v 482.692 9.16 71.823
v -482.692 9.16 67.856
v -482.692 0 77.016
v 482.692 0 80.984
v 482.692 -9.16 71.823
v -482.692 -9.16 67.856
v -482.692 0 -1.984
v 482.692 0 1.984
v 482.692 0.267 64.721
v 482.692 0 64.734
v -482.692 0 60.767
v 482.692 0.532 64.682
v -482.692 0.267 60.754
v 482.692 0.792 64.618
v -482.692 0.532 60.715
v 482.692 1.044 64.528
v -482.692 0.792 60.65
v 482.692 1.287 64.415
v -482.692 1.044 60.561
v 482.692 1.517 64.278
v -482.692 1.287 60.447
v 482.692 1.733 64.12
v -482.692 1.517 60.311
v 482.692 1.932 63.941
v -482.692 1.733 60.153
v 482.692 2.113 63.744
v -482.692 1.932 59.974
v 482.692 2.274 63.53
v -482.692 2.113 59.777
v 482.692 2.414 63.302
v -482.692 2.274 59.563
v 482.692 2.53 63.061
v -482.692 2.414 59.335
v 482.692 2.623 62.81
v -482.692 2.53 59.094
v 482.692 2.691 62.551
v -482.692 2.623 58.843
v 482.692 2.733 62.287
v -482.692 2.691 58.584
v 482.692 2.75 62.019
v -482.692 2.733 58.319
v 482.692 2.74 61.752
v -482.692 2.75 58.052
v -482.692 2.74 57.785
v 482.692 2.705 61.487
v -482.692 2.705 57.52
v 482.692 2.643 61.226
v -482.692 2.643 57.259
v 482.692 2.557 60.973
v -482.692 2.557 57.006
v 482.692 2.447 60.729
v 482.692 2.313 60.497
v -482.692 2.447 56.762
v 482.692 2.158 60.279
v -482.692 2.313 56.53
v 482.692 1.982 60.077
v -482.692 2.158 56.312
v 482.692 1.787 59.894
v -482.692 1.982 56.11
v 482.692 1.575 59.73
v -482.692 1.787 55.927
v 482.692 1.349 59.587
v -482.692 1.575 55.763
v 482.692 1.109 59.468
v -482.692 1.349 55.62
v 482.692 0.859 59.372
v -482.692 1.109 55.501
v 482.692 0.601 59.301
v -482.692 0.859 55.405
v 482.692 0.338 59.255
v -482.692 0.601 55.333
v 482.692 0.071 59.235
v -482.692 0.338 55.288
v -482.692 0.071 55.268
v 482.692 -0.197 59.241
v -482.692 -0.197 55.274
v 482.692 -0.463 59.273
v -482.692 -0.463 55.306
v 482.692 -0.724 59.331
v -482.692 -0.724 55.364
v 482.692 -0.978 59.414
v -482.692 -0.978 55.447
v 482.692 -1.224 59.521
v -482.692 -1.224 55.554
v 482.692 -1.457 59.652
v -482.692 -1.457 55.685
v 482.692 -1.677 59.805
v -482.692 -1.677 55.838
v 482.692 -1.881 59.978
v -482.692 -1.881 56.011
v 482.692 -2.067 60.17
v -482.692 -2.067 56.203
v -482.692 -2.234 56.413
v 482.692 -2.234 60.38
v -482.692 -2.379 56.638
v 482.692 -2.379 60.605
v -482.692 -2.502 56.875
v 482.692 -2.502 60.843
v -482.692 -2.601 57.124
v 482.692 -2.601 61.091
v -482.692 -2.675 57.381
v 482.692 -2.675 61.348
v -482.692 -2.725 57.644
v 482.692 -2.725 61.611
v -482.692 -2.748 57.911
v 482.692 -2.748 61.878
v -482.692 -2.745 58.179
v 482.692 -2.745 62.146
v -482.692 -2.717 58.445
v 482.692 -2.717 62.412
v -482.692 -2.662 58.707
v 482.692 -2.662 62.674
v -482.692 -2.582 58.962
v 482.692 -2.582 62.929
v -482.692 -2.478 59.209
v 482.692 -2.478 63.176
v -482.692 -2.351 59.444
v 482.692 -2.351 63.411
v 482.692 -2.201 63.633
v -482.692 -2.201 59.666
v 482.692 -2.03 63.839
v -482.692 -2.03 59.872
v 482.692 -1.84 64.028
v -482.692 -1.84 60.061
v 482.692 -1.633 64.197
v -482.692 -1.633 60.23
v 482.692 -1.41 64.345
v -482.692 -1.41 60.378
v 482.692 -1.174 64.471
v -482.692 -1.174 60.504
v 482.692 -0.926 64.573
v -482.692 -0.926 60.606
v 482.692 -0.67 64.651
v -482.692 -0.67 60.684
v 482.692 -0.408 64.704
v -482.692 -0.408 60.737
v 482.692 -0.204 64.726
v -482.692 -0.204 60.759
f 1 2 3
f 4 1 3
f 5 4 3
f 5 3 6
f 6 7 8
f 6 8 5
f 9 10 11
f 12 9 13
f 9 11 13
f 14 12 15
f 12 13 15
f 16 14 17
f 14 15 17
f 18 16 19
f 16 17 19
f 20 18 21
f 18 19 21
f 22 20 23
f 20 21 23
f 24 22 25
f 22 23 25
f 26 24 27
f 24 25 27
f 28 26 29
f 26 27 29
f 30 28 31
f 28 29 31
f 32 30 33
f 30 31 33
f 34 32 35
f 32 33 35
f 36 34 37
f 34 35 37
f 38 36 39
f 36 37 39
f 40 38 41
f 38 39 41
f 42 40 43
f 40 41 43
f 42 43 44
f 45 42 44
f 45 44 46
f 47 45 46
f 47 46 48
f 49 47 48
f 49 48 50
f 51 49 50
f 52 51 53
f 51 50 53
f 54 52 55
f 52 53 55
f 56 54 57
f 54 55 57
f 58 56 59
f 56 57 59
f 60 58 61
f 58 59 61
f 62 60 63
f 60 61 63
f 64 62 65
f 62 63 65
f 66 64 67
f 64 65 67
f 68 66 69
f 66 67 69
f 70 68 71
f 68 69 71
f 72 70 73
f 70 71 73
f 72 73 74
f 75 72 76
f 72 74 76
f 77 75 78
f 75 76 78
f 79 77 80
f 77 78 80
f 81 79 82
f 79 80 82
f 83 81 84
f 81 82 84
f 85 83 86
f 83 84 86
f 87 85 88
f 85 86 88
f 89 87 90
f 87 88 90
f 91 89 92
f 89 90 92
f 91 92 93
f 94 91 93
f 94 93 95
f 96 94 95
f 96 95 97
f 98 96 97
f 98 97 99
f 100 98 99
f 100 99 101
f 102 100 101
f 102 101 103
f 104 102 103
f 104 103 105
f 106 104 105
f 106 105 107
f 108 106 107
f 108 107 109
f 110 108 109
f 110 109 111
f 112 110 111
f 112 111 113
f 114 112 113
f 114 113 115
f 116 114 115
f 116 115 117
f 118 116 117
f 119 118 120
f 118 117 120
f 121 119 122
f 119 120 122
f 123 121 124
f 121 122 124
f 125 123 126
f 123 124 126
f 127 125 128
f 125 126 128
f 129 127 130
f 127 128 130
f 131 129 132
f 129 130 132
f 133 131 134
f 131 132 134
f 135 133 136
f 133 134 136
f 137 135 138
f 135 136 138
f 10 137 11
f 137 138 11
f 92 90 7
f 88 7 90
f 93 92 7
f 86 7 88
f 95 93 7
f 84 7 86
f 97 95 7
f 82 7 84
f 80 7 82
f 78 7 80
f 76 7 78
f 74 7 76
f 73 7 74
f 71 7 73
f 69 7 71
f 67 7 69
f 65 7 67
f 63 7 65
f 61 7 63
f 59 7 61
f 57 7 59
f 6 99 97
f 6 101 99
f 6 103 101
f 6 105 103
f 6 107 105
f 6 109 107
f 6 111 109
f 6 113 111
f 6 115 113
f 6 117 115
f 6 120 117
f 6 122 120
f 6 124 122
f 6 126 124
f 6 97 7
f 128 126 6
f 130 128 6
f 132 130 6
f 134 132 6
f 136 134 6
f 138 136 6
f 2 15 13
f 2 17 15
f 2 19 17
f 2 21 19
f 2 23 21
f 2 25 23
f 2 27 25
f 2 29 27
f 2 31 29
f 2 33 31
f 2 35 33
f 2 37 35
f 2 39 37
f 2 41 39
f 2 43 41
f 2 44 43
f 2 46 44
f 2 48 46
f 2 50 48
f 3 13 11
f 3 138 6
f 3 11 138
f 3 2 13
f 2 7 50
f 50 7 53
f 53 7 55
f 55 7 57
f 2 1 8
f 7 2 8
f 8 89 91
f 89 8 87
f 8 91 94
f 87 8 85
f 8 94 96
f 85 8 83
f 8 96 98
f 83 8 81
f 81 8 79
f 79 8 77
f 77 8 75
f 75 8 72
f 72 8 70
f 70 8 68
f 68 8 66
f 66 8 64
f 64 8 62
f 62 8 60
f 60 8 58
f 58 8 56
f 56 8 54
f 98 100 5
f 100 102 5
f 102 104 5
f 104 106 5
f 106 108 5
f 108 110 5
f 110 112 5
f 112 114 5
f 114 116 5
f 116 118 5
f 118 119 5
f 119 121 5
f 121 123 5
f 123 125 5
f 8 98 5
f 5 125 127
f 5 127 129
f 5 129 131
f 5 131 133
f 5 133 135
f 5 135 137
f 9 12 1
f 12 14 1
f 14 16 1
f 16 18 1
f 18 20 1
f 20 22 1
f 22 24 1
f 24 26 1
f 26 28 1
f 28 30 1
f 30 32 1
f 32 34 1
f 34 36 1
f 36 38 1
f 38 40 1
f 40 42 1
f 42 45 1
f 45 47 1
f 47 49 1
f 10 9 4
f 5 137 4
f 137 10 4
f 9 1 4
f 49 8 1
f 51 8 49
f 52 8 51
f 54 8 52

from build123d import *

# Parameters (mm, degrees)
AILERON_DEPTH           = 482.696053238
SKETCH2_R               = 2.75
CUT_EXTRUDE2_DEPTH      = 483.696053238
CUT_EXTRUDE2_DEPTH_BACK = 484.024800506


with BuildPart() as part:
    # aileron_root → aileron (new body, symmetric, along a direction that is not the sketch's normal)
    with BuildSketch(Plane(origin=(0, 0, 0), x_dir=(0, 0, -1), z_dir=(1, 0, 0))):
        Polygon((-80, -10.492874398), (-80, 10.492874398), (0, 0), align=None)
    extrude(amount=AILERON_DEPTH, dir=(0.999991557, 0, 0.004109341), both=True)

    # Sketch2 → Cut-Extrude2 (cut, two sides)
    with BuildSketch(Plane(origin=(0, 0, 0), x_dir=(-0.004109341, 0, 0.999991557), z_dir=(-0.999991557, 0, -0.004109341))) as cut_extrude2_sk:
        with Locations((60, 0)):
            Circle(SKETCH2_R)
        Polygon((78.99932453, 0), (68.506450132, -10.492874398), (79.99932453, -10.492874398), (79.99932453, 10.492874398), (68.506450132, 10.492874398), align=None)
    extrude(amount=CUT_EXTRUDE2_DEPTH, mode=Mode.SUBTRACT)
    extrude(cut_extrude2_sk.sketch, amount=-CUT_EXTRUDE2_DEPTH_BACK, mode=Mode.SUBTRACT)


solid = part.part
